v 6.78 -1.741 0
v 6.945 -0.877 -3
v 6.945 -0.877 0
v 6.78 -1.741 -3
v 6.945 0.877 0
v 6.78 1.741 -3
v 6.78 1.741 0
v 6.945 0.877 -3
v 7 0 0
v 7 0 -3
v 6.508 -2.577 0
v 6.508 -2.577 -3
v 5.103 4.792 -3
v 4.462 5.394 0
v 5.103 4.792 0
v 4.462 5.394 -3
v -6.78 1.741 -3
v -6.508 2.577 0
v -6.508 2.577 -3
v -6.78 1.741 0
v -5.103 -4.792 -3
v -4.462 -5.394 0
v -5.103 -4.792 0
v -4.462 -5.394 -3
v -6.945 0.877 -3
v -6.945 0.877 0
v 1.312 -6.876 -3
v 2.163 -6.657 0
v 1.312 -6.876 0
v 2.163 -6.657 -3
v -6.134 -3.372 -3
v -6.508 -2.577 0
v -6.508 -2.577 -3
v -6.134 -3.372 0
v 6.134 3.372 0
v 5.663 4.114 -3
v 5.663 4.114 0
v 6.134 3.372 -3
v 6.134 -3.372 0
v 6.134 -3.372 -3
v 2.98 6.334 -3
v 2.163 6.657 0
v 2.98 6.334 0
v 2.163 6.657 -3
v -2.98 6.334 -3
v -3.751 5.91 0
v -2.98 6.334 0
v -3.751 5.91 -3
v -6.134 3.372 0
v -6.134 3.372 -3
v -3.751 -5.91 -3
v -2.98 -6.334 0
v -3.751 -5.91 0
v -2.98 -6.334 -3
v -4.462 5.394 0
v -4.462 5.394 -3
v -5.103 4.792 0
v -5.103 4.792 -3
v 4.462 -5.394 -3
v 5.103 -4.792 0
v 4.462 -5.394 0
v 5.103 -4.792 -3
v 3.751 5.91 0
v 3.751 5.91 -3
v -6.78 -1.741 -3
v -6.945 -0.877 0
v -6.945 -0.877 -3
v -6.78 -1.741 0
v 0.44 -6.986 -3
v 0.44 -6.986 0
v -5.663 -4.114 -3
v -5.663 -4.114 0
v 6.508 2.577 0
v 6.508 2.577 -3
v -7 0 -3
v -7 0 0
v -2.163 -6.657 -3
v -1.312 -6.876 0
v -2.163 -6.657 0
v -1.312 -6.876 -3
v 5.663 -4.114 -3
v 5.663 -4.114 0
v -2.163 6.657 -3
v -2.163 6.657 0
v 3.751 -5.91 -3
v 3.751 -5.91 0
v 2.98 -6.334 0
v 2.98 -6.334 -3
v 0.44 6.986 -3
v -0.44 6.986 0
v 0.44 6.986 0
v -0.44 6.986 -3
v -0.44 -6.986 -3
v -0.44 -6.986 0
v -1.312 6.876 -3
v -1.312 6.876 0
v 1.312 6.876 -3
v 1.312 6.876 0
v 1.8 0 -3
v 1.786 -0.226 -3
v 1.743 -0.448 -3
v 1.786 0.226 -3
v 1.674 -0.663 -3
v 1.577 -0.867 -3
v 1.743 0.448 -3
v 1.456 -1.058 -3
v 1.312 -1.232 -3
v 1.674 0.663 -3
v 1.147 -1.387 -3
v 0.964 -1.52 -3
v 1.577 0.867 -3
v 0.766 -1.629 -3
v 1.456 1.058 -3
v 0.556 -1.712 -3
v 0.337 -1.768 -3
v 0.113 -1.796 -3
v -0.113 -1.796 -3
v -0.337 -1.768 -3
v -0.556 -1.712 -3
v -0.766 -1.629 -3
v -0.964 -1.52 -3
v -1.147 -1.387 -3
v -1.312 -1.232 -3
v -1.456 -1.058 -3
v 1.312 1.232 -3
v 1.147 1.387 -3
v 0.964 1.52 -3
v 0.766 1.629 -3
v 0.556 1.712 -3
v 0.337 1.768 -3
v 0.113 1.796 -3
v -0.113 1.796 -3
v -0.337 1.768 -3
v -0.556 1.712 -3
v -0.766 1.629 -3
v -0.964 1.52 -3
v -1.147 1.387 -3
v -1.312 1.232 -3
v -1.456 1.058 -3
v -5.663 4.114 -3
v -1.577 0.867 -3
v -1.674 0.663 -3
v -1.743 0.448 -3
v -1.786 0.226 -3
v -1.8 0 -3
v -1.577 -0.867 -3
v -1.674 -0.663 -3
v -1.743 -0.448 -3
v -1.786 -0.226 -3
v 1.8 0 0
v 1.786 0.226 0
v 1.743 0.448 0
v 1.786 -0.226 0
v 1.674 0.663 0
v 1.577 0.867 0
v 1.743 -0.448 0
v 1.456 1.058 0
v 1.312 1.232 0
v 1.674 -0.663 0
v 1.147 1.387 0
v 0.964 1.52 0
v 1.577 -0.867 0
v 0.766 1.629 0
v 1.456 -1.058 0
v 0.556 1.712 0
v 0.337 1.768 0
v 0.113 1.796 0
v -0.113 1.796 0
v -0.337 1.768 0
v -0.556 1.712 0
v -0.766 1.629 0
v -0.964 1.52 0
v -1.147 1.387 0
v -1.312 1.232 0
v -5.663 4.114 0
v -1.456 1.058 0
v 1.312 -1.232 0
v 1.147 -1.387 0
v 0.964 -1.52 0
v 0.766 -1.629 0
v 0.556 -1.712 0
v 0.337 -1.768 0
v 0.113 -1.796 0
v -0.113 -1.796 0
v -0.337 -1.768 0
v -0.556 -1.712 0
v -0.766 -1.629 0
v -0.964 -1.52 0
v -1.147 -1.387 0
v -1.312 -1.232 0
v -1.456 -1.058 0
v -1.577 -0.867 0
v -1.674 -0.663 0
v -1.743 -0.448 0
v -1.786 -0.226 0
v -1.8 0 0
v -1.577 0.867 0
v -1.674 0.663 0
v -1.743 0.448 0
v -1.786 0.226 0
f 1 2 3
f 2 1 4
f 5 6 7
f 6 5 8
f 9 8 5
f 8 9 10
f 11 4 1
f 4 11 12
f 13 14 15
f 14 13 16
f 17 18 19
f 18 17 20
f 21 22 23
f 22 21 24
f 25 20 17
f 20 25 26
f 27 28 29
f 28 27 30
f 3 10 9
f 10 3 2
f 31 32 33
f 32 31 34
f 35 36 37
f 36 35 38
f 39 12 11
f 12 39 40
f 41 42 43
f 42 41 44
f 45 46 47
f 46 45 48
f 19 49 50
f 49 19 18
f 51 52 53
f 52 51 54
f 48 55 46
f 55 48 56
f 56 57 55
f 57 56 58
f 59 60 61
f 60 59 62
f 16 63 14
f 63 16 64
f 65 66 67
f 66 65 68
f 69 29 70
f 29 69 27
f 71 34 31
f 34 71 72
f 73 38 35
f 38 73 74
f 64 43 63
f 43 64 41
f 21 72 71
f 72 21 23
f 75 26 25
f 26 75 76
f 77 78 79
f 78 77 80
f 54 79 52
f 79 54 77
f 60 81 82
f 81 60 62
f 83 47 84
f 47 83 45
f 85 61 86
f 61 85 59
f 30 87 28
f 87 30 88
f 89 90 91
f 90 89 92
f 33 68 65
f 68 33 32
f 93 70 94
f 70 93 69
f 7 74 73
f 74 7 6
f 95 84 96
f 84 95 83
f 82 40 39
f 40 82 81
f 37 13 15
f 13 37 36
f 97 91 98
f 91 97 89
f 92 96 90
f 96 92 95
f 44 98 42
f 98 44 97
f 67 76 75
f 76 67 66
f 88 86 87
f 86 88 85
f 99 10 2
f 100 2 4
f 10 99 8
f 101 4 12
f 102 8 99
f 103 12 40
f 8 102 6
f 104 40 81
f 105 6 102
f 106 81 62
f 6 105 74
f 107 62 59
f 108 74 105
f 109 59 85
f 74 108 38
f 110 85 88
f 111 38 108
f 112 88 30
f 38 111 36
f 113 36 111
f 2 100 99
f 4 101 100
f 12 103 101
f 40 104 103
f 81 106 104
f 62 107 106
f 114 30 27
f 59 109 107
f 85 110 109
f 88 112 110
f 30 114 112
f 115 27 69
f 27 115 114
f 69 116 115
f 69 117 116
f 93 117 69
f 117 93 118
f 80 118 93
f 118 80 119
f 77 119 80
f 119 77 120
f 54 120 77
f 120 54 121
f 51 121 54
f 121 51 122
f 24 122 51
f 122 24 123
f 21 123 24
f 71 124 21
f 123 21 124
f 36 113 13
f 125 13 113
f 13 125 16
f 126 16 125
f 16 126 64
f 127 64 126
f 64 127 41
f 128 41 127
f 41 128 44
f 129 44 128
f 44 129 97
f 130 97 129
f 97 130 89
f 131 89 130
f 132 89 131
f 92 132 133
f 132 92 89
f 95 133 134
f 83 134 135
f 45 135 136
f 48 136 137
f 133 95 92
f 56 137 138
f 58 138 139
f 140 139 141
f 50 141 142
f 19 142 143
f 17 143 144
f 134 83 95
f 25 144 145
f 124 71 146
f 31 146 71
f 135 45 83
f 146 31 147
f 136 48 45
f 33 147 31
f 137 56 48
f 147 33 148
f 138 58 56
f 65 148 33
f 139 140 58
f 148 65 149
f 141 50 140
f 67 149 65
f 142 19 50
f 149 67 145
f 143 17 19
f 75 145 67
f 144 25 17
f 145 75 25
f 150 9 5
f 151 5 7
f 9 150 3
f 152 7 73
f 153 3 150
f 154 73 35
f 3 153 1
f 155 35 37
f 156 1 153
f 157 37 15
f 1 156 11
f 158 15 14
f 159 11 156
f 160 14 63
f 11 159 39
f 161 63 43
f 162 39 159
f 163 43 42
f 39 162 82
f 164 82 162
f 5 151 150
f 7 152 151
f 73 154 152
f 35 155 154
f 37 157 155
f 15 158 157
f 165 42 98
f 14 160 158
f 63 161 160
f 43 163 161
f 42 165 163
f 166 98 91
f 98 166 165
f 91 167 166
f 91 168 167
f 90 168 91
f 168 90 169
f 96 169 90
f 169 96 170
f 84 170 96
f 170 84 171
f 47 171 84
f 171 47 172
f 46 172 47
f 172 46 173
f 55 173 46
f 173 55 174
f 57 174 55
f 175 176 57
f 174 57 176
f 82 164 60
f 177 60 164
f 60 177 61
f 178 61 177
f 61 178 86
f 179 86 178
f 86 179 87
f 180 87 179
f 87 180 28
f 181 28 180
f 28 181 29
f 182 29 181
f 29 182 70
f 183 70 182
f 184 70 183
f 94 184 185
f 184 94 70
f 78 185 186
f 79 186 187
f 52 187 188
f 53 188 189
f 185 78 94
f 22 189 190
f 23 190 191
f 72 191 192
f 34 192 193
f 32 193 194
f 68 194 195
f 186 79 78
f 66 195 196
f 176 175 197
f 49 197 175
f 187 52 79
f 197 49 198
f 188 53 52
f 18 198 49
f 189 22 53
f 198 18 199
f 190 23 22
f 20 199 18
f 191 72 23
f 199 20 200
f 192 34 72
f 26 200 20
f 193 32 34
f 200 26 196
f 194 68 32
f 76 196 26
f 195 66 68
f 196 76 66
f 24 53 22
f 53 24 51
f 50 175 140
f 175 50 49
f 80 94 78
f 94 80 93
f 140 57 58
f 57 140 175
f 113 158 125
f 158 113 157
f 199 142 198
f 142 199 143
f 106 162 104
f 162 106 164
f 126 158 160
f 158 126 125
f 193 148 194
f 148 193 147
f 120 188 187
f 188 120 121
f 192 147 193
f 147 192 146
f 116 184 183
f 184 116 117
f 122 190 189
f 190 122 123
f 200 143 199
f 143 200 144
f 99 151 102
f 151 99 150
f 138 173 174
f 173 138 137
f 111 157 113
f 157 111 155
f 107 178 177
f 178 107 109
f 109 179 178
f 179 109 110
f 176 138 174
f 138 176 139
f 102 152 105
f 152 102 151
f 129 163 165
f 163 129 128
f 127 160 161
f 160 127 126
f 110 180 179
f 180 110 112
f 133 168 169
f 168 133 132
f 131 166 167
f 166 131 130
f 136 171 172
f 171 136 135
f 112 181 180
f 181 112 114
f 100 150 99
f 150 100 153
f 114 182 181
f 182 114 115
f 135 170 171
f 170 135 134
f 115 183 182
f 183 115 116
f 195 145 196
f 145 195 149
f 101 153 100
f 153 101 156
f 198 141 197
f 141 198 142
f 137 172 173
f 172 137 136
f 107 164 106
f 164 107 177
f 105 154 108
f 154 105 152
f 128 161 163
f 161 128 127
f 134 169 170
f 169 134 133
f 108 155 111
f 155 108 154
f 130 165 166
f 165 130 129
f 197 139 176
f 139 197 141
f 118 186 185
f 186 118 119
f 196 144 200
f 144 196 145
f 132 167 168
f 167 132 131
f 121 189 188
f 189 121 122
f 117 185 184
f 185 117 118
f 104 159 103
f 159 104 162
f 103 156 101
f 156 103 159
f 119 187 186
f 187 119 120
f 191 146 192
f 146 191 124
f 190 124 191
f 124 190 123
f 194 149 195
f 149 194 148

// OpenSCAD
$fn = 50;


difference() {
	union() {
		translate(v = [0, 0, -3.0000000000]) {
			cylinder(h = 3, r = 7.0000000000);
		}
	}
	union() {
		#translate(v = [0, 0, -3]) {
			cylinder(h = 3, r = 1.8000000000);
		}
	}
}
